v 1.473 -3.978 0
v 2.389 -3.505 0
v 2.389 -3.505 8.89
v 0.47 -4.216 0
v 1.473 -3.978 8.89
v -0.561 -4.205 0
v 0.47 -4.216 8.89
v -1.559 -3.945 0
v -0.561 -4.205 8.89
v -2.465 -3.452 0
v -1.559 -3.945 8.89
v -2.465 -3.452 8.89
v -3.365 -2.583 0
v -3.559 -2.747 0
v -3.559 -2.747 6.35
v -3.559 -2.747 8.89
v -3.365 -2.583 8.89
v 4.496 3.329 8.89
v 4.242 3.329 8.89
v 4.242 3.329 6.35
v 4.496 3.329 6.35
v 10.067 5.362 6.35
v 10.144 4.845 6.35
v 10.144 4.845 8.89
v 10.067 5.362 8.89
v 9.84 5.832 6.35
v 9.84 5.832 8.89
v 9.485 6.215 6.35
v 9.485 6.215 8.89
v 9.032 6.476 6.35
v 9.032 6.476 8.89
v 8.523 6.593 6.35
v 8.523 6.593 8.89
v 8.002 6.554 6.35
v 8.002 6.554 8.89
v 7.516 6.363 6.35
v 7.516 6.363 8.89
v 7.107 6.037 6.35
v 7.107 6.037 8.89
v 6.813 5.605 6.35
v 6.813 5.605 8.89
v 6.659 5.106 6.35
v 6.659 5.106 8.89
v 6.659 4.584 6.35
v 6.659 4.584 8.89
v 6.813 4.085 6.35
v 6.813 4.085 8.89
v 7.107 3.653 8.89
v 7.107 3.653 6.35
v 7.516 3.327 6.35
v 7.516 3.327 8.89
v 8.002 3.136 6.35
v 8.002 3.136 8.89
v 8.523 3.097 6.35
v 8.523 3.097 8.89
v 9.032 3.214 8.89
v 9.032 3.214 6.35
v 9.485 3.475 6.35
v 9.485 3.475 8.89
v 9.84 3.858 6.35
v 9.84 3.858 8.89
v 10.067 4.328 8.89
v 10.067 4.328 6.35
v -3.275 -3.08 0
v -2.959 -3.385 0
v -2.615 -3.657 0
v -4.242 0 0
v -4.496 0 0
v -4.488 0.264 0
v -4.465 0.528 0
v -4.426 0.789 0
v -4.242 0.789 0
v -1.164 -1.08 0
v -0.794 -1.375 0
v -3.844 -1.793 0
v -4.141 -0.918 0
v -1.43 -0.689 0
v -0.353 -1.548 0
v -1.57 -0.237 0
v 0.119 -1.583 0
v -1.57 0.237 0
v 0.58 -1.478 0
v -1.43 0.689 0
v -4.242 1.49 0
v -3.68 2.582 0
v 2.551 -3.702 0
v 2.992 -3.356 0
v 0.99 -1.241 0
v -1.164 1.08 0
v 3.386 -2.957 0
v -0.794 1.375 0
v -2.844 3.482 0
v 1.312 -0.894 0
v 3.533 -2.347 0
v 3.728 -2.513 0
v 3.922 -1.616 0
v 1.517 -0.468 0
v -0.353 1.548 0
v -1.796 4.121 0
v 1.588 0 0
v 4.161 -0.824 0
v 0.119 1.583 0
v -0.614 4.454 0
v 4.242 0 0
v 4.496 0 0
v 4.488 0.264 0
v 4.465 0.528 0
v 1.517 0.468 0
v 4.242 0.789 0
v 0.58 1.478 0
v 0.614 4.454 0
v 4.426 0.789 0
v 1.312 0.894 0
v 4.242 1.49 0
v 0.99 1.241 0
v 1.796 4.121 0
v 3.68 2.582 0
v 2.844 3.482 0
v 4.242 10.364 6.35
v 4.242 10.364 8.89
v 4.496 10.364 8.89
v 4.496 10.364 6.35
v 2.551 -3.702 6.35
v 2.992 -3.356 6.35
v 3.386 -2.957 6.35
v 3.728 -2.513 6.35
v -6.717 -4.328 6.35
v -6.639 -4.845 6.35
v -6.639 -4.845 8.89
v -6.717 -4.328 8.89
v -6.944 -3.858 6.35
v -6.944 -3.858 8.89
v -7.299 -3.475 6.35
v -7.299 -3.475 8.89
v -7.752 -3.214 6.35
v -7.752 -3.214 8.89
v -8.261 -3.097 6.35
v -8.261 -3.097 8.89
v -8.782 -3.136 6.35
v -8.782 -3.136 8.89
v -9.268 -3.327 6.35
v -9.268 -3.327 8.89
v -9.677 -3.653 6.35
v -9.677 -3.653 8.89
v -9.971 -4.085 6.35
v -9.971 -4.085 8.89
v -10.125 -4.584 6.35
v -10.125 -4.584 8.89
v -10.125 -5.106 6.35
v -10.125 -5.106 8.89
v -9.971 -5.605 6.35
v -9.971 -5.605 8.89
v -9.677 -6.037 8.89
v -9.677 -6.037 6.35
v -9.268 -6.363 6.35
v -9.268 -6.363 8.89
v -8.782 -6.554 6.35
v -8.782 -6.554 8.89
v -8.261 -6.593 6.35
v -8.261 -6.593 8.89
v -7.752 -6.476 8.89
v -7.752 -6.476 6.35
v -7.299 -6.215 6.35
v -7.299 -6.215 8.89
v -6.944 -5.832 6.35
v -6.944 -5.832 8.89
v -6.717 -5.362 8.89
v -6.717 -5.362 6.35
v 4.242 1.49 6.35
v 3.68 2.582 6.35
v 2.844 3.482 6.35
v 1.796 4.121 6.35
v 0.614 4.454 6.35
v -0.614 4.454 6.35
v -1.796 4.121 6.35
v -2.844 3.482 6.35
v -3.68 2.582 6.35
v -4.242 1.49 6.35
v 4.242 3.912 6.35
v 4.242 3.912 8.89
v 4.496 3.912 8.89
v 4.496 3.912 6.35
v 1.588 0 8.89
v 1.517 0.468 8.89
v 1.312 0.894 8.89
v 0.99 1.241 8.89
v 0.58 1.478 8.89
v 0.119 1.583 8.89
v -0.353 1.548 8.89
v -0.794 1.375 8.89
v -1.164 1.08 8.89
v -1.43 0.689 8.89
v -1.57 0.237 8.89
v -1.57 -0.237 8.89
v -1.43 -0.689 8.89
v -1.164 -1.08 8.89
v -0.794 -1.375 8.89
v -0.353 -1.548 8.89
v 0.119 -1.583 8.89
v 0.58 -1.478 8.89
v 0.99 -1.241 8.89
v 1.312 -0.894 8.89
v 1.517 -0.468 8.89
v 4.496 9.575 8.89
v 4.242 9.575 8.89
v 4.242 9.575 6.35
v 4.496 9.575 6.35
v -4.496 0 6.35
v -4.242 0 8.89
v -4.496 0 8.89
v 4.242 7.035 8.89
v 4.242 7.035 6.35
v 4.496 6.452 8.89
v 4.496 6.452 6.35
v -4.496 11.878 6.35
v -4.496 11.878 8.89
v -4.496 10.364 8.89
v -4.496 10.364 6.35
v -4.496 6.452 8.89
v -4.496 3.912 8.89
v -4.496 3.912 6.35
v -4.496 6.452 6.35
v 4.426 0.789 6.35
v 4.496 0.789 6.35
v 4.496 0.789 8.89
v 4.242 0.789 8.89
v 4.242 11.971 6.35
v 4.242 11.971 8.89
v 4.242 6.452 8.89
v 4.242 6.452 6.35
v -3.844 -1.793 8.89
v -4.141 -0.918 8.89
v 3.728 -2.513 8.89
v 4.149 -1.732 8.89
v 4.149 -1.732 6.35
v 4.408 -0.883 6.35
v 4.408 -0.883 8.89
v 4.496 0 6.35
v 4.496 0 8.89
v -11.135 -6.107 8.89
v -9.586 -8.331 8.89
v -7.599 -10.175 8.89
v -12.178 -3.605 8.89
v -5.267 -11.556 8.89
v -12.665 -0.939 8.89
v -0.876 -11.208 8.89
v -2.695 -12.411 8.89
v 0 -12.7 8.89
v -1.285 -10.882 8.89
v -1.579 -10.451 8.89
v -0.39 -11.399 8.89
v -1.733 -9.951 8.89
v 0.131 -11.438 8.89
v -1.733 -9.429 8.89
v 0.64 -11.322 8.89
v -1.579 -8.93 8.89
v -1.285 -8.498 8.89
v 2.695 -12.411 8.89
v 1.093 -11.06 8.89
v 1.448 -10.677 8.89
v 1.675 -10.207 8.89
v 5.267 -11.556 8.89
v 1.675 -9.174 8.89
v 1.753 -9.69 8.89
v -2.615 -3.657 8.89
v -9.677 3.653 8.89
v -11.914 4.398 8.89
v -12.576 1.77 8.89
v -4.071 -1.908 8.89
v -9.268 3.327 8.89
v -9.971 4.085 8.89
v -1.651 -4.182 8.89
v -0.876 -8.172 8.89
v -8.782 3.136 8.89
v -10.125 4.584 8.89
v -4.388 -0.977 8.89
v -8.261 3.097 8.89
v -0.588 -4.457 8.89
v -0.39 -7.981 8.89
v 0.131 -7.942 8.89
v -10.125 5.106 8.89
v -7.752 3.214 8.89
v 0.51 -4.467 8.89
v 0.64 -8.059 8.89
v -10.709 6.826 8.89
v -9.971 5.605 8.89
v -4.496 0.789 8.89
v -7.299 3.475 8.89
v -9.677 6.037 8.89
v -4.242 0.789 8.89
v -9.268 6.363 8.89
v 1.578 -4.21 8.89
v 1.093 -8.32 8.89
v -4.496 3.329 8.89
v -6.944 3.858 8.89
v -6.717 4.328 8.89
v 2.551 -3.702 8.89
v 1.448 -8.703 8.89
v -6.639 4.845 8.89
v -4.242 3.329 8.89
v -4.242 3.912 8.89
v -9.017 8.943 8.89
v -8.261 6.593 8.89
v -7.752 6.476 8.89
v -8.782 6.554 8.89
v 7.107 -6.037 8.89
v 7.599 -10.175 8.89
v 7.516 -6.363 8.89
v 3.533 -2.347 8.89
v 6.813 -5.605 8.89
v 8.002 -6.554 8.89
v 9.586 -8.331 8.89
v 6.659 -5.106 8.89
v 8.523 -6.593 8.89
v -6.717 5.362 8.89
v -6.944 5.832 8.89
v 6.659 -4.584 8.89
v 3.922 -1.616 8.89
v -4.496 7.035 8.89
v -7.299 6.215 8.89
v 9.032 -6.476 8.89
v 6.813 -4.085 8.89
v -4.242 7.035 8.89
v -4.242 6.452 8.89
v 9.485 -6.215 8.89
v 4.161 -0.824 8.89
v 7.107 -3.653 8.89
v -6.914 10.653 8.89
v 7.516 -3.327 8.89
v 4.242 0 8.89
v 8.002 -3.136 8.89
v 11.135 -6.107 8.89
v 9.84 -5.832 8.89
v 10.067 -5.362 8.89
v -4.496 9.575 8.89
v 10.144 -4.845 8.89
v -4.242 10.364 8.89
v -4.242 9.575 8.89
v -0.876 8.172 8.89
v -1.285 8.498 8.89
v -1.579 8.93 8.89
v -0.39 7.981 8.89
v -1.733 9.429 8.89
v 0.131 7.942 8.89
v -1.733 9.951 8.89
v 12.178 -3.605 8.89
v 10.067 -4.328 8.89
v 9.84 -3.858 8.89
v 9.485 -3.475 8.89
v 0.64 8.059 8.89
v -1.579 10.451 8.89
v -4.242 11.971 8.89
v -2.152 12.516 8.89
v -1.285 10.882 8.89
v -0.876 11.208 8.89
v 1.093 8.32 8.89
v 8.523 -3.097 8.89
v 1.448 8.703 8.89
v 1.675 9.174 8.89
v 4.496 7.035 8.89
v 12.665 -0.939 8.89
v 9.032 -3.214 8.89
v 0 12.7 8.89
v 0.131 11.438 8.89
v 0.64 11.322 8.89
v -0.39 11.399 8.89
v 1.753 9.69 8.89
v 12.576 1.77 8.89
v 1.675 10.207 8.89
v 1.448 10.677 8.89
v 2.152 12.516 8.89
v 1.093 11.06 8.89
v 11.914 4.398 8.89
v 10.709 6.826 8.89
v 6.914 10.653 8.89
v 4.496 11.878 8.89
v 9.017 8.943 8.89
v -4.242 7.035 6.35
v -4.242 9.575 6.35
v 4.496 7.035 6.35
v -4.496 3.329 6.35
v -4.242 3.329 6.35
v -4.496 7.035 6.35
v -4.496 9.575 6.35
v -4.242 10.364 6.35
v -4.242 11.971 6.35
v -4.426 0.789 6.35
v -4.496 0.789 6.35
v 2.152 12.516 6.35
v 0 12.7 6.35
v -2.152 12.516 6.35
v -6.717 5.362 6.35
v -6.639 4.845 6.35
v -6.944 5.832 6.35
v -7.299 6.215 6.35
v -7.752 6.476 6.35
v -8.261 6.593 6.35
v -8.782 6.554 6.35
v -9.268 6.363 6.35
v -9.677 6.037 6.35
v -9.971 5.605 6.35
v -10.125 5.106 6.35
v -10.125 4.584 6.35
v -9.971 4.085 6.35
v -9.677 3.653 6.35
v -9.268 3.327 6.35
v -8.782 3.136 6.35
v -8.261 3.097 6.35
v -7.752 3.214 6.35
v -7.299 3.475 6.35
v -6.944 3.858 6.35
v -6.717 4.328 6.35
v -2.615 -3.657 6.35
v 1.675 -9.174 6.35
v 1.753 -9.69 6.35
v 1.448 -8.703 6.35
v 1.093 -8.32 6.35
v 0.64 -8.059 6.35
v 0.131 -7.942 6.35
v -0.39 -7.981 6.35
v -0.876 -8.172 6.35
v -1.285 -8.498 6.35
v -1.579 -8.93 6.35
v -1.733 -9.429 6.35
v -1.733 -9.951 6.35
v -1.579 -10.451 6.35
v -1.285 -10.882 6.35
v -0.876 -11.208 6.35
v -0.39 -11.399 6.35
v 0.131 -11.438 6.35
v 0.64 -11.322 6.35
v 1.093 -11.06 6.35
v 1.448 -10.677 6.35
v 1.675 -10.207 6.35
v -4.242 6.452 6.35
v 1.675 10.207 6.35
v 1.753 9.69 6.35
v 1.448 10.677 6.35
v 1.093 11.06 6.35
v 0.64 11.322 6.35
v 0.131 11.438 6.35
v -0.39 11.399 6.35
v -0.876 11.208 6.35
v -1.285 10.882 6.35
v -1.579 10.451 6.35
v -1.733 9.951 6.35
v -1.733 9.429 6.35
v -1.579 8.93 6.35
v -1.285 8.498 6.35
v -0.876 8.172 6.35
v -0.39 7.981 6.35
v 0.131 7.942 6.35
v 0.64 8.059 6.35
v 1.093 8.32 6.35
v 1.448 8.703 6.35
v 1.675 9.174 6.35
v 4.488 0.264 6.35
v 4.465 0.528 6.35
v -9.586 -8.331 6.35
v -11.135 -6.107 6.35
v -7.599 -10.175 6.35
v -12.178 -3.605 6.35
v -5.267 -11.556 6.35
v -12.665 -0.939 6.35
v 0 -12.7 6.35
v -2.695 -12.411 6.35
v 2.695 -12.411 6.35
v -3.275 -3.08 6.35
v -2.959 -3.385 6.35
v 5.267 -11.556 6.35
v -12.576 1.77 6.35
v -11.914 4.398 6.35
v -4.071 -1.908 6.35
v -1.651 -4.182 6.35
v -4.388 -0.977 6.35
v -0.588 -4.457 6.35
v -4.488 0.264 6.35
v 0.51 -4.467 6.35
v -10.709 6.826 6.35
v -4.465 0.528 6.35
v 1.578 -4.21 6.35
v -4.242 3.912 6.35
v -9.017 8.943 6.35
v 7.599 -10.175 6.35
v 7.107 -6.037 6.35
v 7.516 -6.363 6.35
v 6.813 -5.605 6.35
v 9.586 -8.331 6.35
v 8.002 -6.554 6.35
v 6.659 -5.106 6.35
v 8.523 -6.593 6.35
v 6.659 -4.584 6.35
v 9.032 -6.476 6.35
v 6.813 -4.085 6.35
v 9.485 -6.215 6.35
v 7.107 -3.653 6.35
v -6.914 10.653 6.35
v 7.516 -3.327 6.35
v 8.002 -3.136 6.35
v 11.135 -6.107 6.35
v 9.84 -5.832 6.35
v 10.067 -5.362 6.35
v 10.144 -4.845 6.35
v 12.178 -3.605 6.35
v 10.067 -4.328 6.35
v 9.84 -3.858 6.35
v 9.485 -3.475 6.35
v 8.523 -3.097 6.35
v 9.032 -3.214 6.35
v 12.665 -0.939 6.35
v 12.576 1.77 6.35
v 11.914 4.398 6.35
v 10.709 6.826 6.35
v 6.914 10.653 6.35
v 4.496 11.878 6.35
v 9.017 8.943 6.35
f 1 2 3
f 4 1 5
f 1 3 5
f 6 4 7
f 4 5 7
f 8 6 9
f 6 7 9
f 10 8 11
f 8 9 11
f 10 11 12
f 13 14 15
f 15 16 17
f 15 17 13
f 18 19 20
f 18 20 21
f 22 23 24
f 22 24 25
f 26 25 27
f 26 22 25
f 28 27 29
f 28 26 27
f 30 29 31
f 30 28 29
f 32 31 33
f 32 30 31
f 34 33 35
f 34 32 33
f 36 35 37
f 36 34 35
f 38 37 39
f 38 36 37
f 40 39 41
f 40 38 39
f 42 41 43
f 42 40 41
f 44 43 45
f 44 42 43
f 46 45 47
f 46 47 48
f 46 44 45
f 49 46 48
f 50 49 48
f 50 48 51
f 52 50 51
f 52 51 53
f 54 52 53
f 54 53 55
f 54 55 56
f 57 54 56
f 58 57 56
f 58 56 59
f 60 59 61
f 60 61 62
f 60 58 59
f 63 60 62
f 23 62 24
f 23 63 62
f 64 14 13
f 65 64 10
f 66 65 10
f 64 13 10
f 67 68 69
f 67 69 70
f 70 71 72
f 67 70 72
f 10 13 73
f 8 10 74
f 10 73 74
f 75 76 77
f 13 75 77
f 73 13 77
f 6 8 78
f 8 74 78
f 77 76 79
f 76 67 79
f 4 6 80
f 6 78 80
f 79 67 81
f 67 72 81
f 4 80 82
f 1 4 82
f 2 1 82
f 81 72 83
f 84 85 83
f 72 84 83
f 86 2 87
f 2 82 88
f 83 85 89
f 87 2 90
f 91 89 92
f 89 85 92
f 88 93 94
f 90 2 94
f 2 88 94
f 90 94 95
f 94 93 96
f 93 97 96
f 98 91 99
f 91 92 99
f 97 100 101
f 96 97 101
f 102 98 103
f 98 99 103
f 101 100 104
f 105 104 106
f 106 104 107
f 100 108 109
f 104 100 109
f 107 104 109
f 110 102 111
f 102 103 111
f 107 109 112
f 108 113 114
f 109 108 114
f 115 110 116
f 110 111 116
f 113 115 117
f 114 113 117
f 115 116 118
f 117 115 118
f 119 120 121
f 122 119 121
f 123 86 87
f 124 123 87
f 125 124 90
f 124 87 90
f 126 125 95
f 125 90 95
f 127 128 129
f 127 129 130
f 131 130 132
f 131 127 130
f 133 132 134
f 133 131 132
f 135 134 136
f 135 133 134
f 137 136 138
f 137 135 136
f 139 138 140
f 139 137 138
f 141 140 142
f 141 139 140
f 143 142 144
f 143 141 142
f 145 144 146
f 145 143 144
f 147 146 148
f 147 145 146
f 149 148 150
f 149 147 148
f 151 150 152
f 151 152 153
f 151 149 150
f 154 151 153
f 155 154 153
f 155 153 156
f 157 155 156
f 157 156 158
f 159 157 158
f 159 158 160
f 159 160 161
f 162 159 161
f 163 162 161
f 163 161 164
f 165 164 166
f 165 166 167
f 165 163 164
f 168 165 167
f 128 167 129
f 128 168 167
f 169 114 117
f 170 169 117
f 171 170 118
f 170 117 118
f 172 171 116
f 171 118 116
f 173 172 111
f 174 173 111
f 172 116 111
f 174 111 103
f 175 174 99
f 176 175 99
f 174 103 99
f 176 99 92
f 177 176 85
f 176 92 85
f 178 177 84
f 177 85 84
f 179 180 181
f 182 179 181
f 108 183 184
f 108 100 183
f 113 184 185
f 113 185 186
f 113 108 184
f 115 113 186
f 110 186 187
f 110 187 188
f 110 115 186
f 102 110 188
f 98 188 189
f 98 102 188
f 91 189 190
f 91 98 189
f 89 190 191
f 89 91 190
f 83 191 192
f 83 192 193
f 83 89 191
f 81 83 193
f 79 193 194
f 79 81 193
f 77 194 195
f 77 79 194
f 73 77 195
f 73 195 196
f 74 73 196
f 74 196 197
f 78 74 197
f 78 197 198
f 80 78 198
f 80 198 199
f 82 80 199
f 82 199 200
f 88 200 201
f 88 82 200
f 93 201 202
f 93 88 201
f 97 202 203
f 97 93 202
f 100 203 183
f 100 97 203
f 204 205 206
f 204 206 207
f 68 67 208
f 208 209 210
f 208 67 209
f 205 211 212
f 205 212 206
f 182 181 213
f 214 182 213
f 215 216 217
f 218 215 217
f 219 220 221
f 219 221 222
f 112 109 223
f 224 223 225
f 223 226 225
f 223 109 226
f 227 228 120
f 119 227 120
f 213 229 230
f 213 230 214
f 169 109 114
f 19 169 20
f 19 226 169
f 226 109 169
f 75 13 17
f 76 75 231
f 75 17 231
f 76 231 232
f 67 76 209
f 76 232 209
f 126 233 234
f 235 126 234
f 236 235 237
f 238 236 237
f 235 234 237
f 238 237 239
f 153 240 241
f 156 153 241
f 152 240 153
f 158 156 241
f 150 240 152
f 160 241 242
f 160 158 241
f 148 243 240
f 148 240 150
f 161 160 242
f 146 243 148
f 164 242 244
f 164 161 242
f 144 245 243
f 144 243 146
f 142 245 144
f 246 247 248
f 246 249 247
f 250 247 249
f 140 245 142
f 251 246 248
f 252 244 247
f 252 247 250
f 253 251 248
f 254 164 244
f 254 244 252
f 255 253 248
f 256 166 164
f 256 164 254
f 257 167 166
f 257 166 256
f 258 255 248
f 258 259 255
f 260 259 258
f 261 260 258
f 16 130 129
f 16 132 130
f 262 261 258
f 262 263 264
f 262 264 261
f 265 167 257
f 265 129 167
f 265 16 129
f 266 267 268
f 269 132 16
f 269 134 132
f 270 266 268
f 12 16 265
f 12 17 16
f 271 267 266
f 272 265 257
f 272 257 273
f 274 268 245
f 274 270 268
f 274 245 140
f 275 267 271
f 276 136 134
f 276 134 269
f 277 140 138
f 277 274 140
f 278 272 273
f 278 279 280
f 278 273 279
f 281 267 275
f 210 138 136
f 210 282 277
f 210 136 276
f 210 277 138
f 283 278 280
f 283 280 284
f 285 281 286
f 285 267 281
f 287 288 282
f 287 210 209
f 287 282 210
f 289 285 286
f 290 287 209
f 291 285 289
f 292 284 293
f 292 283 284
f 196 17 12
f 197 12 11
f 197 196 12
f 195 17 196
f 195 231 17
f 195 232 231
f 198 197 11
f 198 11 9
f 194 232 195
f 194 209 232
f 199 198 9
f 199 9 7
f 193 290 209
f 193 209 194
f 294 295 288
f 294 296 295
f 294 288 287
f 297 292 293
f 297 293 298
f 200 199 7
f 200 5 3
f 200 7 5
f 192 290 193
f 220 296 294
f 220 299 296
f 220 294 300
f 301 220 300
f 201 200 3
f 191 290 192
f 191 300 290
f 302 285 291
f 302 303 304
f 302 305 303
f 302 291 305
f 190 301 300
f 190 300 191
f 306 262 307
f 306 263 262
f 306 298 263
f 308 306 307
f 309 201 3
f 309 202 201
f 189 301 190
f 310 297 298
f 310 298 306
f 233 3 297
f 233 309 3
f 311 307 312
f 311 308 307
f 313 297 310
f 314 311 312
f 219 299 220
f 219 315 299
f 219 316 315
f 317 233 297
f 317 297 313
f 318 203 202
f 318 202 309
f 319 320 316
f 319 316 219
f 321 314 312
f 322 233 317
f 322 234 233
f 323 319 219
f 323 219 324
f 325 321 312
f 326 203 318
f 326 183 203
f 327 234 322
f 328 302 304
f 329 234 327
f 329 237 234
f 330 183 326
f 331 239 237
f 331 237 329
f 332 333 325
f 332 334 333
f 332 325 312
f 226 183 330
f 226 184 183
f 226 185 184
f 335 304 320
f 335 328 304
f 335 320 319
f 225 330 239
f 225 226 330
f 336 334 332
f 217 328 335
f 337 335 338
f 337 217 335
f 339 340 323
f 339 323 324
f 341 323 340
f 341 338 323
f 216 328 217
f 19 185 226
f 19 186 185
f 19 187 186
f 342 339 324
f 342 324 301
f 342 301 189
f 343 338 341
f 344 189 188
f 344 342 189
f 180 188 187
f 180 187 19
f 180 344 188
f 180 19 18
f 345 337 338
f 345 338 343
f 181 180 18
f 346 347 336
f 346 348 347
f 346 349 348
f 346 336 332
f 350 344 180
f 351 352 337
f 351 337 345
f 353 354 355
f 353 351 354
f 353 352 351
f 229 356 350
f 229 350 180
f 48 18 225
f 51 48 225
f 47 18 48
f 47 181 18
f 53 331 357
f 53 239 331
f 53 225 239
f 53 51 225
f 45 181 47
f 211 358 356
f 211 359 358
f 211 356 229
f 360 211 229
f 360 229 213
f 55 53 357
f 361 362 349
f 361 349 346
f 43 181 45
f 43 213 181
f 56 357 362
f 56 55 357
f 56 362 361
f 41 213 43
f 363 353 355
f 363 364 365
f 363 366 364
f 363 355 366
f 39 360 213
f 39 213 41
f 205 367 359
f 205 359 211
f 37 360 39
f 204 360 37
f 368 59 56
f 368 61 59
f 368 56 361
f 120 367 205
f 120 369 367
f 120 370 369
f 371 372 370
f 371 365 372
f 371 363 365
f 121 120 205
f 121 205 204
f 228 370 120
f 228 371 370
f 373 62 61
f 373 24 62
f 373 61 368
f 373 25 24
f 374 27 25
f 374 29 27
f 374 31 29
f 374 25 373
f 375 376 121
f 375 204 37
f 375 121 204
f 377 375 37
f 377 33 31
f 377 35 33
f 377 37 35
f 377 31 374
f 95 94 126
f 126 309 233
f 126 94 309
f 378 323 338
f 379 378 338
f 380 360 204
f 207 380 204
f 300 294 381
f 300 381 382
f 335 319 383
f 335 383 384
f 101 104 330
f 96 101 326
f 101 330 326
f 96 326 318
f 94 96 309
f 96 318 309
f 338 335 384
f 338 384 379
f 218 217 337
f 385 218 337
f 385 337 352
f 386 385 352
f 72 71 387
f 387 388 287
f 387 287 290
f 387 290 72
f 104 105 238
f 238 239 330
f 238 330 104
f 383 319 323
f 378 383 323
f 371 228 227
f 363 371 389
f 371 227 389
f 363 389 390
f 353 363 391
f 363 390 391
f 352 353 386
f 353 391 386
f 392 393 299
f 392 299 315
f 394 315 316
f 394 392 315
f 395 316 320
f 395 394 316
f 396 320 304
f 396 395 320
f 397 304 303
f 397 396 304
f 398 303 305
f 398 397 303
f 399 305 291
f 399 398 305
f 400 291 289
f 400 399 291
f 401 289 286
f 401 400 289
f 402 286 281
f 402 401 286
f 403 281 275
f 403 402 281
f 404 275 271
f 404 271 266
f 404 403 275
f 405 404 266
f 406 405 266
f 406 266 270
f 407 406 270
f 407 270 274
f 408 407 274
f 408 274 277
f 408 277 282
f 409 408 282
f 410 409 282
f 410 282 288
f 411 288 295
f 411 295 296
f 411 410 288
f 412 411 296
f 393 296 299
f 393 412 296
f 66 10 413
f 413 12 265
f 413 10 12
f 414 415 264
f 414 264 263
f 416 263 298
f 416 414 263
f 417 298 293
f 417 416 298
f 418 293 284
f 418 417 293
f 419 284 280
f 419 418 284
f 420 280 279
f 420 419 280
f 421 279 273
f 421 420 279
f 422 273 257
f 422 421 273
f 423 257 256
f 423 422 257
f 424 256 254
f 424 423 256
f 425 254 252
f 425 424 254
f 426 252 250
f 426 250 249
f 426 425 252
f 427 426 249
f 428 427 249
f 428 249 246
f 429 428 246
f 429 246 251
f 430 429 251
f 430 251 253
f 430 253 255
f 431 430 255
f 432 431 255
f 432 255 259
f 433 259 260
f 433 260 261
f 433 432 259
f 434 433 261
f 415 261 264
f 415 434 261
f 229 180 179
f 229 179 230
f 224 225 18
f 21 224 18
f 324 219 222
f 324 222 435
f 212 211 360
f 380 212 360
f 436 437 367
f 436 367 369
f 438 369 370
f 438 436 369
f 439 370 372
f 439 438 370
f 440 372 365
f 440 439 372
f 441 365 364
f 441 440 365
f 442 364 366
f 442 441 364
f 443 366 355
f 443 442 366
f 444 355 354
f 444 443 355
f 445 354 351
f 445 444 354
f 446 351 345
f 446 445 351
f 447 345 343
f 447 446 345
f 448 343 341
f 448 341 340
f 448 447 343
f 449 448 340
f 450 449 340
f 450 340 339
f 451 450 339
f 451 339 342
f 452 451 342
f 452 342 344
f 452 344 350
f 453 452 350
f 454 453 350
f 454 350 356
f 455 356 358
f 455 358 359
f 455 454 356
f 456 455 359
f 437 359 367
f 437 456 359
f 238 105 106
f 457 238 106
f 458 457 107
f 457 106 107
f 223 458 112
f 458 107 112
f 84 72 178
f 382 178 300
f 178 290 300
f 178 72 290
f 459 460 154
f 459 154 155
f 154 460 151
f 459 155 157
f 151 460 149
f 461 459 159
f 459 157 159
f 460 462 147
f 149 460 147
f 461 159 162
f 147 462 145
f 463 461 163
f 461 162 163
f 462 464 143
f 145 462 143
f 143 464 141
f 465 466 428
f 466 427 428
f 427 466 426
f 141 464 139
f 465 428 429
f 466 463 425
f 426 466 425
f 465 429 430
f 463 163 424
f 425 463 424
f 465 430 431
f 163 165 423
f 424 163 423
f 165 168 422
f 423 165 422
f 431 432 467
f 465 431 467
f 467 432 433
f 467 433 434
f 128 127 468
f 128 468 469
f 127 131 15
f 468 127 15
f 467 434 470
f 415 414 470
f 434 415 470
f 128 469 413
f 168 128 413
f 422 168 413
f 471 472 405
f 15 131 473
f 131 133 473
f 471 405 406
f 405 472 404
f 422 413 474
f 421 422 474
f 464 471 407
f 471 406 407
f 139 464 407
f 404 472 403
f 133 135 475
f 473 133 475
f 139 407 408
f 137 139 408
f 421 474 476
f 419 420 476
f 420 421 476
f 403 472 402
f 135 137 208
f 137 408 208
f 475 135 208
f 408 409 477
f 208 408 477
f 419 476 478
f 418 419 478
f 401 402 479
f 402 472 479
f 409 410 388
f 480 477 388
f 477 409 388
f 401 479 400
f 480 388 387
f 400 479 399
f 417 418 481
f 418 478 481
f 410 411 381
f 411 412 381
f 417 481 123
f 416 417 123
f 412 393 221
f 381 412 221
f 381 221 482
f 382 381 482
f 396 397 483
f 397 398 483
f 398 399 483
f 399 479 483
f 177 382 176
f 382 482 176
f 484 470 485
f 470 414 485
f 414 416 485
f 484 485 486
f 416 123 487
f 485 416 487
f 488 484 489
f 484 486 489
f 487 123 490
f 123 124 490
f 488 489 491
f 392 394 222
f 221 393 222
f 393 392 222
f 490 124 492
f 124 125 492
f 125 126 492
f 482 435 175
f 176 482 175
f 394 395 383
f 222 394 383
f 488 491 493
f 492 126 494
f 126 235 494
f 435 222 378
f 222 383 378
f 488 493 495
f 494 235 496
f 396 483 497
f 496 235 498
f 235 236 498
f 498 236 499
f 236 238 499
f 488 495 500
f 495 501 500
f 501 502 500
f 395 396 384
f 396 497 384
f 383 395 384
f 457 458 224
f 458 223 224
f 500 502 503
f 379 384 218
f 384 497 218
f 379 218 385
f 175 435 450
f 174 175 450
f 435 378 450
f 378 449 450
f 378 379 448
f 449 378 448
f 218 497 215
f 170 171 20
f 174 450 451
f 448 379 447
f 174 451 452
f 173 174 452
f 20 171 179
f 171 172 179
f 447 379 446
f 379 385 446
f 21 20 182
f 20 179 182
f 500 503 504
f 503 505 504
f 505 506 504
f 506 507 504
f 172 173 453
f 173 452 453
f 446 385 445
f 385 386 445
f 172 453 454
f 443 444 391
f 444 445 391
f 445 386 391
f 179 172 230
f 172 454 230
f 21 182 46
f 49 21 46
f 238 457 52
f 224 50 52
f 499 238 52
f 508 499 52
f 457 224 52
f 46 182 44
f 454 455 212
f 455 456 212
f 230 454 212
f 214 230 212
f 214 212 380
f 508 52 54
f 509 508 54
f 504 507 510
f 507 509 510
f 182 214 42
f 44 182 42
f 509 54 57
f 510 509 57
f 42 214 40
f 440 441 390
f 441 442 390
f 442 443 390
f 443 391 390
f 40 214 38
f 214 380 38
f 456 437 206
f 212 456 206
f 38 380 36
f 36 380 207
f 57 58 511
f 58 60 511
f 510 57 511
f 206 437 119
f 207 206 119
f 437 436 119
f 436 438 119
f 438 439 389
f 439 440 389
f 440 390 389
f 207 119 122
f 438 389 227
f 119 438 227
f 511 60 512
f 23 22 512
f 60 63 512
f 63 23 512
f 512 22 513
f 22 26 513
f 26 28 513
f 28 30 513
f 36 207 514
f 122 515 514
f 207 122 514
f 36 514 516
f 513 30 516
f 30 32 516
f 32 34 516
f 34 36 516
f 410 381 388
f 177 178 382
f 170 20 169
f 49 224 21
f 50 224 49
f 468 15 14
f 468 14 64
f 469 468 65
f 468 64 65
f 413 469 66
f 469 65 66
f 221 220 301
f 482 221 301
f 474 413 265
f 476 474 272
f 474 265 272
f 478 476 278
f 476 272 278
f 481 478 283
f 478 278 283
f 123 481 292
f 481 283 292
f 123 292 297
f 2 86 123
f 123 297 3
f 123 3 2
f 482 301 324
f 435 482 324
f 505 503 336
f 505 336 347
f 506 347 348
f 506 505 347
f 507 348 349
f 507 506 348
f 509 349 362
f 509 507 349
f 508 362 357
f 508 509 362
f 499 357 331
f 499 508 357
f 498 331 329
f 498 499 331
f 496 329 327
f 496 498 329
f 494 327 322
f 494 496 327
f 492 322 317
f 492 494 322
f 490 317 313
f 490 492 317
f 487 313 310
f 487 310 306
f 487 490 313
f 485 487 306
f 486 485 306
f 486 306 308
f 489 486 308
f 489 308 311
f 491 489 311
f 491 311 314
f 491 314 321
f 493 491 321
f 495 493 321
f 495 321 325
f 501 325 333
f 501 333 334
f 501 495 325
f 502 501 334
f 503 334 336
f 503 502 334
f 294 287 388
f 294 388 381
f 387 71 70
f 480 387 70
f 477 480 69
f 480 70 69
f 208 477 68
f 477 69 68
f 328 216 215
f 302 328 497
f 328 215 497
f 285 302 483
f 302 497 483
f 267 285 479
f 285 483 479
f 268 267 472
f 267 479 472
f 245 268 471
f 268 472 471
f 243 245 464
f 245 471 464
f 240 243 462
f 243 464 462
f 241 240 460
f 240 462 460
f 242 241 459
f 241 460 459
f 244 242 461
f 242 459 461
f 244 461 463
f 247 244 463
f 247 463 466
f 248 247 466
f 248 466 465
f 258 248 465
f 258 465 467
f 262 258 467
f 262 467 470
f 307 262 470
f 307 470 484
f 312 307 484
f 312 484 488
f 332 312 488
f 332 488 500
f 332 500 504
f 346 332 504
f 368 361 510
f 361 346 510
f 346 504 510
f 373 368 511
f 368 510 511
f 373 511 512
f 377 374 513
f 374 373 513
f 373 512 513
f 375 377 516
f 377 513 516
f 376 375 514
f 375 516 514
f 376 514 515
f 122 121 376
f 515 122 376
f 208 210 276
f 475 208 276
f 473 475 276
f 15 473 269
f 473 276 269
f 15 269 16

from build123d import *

# Parameters (mm, degrees)
F0_R     = 4.4958
F0_R_2   = 1.5875
F1_DEPTH = 6.35
F2_R     = 12.7
F2_R_2   = 1.7526
F2_R_3   = 1.5875
F3_DEPTH = 2.54
F4_W     = 0.254
F4_H     = 2.54
F5_DEPTH = 25.4


with BuildPart() as f1:
    # F0 (on Top) → F1 (new body)
    with BuildSketch(Plane.XY):
        Circle(F0_R)
        Circle(F0_R_2, mode=Mode.SUBTRACT)
    extrude(amount=F1_DEPTH)

    # F2 (on face) → F3 (join)
    with BuildSketch(Plane.XY.offset(6.35)):
        Circle(F2_R)
        with Locations((0, -9.6901)):
            Circle(F2_R_2, mode=Mode.SUBTRACT)
        with Locations((-8.3918727652, -4.84505)):
            Circle(F2_R_2, mode=Mode.SUBTRACT)
        Circle(F2_R_3, mode=Mode.SUBTRACT)
        with Locations((8.3918727652, -4.84505)):
            Circle(F2_R_2, mode=Mode.SUBTRACT)
        with Locations((-8.3918727652, 4.84505)):
            Circle(F2_R_2, mode=Mode.SUBTRACT)
        with Locations((0, 9.6901)):
            Circle(F2_R_2, mode=Mode.SUBTRACT)
        with Locations((8.3918727652, 4.84505)):
            Circle(F2_R_2, mode=Mode.SUBTRACT)
    extrude(amount=F3_DEPTH)

    # F4 (on face) → F5 (cut)
    with BuildSketch(Plane.XY.offset(8.89)):
        with BuildLine():
            Line((-4.2418, 0), (-4.4958, 0))
            ThreePointArc((-4.4958, 0), (-4.2552090791, -1.45100425), (-3.5591865681, -2.7467086874))
            Line((-3.5591865681, -2.7467086874), (-3.3648710152, -2.5827331048))
            ThreePointArc((-3.3648710152, -2.5827331048), (-4.0165891695, -1.3637736923), (-4.2418, 0))
        make_face()
        with Locations((4.3688, 8.3054968122)):
            Rectangle(F4_W, F4_H)
        with Locations((4.3688, 5.1822738967)):
            Rectangle(F4_W, F4_H)
        with BuildLine():
            ThreePointArc((2.3889624864, -3.5050999242), (-0.0460958584, -4.2415495296), (-2.4645739513, -3.4523531799))
            Line((-2.4645739513, -3.4523531799), (-2.6152441527, -3.656872388))
            ThreePointArc((-2.6152441527, -3.656872388), (-0.0391240272, -4.4956297613), (2.5512036829, -3.7018343302))
            Line((2.5512036829, -3.7018343302), (2.3889624864, -3.5050999242))
        make_face()
        with Locations((-4.3688, 8.3054968122)):
            Rectangle(F4_W, F4_H)
        with Locations((-4.3688, 5.1822738967)):
            Rectangle(F4_W, F4_H)
        with Locations((-4.3688, 2.0590509812)):
            Rectangle(F4_W, F4_H)
        with Locations((4.3688, 2.0590509812)):
            Rectangle(F4_W, F4_H)
        with BuildLine():
            ThreePointArc((3.7276640074, -2.5133122941), (4.2994795897, -1.3140368708), (4.4958, 0))
            Line((4.4958, 0), (4.2418, 0))
            ThreePointArc((4.2418, 0), (4.0608262018, -1.2257886437), (3.5333470796, -2.3469822444))
            Line((3.5333470796, -2.3469822444), (3.7276640074, -2.5133122941))
        make_face()
        Polygon((-4.4958, 11.8806733481), (-4.4958, 10.3643210605), (-4.2418, 10.3643210605), (-4.2418, 11.9706780409), align=None)
        Polygon((4.2418, 11.973758473), (4.2418, 10.3643210605), (4.4958, 10.3643210605), (4.4958, 11.8776168637), align=None)
    extrude(amount=-F5_DEPTH, mode=Mode.SUBTRACT)


solid = f1.part
